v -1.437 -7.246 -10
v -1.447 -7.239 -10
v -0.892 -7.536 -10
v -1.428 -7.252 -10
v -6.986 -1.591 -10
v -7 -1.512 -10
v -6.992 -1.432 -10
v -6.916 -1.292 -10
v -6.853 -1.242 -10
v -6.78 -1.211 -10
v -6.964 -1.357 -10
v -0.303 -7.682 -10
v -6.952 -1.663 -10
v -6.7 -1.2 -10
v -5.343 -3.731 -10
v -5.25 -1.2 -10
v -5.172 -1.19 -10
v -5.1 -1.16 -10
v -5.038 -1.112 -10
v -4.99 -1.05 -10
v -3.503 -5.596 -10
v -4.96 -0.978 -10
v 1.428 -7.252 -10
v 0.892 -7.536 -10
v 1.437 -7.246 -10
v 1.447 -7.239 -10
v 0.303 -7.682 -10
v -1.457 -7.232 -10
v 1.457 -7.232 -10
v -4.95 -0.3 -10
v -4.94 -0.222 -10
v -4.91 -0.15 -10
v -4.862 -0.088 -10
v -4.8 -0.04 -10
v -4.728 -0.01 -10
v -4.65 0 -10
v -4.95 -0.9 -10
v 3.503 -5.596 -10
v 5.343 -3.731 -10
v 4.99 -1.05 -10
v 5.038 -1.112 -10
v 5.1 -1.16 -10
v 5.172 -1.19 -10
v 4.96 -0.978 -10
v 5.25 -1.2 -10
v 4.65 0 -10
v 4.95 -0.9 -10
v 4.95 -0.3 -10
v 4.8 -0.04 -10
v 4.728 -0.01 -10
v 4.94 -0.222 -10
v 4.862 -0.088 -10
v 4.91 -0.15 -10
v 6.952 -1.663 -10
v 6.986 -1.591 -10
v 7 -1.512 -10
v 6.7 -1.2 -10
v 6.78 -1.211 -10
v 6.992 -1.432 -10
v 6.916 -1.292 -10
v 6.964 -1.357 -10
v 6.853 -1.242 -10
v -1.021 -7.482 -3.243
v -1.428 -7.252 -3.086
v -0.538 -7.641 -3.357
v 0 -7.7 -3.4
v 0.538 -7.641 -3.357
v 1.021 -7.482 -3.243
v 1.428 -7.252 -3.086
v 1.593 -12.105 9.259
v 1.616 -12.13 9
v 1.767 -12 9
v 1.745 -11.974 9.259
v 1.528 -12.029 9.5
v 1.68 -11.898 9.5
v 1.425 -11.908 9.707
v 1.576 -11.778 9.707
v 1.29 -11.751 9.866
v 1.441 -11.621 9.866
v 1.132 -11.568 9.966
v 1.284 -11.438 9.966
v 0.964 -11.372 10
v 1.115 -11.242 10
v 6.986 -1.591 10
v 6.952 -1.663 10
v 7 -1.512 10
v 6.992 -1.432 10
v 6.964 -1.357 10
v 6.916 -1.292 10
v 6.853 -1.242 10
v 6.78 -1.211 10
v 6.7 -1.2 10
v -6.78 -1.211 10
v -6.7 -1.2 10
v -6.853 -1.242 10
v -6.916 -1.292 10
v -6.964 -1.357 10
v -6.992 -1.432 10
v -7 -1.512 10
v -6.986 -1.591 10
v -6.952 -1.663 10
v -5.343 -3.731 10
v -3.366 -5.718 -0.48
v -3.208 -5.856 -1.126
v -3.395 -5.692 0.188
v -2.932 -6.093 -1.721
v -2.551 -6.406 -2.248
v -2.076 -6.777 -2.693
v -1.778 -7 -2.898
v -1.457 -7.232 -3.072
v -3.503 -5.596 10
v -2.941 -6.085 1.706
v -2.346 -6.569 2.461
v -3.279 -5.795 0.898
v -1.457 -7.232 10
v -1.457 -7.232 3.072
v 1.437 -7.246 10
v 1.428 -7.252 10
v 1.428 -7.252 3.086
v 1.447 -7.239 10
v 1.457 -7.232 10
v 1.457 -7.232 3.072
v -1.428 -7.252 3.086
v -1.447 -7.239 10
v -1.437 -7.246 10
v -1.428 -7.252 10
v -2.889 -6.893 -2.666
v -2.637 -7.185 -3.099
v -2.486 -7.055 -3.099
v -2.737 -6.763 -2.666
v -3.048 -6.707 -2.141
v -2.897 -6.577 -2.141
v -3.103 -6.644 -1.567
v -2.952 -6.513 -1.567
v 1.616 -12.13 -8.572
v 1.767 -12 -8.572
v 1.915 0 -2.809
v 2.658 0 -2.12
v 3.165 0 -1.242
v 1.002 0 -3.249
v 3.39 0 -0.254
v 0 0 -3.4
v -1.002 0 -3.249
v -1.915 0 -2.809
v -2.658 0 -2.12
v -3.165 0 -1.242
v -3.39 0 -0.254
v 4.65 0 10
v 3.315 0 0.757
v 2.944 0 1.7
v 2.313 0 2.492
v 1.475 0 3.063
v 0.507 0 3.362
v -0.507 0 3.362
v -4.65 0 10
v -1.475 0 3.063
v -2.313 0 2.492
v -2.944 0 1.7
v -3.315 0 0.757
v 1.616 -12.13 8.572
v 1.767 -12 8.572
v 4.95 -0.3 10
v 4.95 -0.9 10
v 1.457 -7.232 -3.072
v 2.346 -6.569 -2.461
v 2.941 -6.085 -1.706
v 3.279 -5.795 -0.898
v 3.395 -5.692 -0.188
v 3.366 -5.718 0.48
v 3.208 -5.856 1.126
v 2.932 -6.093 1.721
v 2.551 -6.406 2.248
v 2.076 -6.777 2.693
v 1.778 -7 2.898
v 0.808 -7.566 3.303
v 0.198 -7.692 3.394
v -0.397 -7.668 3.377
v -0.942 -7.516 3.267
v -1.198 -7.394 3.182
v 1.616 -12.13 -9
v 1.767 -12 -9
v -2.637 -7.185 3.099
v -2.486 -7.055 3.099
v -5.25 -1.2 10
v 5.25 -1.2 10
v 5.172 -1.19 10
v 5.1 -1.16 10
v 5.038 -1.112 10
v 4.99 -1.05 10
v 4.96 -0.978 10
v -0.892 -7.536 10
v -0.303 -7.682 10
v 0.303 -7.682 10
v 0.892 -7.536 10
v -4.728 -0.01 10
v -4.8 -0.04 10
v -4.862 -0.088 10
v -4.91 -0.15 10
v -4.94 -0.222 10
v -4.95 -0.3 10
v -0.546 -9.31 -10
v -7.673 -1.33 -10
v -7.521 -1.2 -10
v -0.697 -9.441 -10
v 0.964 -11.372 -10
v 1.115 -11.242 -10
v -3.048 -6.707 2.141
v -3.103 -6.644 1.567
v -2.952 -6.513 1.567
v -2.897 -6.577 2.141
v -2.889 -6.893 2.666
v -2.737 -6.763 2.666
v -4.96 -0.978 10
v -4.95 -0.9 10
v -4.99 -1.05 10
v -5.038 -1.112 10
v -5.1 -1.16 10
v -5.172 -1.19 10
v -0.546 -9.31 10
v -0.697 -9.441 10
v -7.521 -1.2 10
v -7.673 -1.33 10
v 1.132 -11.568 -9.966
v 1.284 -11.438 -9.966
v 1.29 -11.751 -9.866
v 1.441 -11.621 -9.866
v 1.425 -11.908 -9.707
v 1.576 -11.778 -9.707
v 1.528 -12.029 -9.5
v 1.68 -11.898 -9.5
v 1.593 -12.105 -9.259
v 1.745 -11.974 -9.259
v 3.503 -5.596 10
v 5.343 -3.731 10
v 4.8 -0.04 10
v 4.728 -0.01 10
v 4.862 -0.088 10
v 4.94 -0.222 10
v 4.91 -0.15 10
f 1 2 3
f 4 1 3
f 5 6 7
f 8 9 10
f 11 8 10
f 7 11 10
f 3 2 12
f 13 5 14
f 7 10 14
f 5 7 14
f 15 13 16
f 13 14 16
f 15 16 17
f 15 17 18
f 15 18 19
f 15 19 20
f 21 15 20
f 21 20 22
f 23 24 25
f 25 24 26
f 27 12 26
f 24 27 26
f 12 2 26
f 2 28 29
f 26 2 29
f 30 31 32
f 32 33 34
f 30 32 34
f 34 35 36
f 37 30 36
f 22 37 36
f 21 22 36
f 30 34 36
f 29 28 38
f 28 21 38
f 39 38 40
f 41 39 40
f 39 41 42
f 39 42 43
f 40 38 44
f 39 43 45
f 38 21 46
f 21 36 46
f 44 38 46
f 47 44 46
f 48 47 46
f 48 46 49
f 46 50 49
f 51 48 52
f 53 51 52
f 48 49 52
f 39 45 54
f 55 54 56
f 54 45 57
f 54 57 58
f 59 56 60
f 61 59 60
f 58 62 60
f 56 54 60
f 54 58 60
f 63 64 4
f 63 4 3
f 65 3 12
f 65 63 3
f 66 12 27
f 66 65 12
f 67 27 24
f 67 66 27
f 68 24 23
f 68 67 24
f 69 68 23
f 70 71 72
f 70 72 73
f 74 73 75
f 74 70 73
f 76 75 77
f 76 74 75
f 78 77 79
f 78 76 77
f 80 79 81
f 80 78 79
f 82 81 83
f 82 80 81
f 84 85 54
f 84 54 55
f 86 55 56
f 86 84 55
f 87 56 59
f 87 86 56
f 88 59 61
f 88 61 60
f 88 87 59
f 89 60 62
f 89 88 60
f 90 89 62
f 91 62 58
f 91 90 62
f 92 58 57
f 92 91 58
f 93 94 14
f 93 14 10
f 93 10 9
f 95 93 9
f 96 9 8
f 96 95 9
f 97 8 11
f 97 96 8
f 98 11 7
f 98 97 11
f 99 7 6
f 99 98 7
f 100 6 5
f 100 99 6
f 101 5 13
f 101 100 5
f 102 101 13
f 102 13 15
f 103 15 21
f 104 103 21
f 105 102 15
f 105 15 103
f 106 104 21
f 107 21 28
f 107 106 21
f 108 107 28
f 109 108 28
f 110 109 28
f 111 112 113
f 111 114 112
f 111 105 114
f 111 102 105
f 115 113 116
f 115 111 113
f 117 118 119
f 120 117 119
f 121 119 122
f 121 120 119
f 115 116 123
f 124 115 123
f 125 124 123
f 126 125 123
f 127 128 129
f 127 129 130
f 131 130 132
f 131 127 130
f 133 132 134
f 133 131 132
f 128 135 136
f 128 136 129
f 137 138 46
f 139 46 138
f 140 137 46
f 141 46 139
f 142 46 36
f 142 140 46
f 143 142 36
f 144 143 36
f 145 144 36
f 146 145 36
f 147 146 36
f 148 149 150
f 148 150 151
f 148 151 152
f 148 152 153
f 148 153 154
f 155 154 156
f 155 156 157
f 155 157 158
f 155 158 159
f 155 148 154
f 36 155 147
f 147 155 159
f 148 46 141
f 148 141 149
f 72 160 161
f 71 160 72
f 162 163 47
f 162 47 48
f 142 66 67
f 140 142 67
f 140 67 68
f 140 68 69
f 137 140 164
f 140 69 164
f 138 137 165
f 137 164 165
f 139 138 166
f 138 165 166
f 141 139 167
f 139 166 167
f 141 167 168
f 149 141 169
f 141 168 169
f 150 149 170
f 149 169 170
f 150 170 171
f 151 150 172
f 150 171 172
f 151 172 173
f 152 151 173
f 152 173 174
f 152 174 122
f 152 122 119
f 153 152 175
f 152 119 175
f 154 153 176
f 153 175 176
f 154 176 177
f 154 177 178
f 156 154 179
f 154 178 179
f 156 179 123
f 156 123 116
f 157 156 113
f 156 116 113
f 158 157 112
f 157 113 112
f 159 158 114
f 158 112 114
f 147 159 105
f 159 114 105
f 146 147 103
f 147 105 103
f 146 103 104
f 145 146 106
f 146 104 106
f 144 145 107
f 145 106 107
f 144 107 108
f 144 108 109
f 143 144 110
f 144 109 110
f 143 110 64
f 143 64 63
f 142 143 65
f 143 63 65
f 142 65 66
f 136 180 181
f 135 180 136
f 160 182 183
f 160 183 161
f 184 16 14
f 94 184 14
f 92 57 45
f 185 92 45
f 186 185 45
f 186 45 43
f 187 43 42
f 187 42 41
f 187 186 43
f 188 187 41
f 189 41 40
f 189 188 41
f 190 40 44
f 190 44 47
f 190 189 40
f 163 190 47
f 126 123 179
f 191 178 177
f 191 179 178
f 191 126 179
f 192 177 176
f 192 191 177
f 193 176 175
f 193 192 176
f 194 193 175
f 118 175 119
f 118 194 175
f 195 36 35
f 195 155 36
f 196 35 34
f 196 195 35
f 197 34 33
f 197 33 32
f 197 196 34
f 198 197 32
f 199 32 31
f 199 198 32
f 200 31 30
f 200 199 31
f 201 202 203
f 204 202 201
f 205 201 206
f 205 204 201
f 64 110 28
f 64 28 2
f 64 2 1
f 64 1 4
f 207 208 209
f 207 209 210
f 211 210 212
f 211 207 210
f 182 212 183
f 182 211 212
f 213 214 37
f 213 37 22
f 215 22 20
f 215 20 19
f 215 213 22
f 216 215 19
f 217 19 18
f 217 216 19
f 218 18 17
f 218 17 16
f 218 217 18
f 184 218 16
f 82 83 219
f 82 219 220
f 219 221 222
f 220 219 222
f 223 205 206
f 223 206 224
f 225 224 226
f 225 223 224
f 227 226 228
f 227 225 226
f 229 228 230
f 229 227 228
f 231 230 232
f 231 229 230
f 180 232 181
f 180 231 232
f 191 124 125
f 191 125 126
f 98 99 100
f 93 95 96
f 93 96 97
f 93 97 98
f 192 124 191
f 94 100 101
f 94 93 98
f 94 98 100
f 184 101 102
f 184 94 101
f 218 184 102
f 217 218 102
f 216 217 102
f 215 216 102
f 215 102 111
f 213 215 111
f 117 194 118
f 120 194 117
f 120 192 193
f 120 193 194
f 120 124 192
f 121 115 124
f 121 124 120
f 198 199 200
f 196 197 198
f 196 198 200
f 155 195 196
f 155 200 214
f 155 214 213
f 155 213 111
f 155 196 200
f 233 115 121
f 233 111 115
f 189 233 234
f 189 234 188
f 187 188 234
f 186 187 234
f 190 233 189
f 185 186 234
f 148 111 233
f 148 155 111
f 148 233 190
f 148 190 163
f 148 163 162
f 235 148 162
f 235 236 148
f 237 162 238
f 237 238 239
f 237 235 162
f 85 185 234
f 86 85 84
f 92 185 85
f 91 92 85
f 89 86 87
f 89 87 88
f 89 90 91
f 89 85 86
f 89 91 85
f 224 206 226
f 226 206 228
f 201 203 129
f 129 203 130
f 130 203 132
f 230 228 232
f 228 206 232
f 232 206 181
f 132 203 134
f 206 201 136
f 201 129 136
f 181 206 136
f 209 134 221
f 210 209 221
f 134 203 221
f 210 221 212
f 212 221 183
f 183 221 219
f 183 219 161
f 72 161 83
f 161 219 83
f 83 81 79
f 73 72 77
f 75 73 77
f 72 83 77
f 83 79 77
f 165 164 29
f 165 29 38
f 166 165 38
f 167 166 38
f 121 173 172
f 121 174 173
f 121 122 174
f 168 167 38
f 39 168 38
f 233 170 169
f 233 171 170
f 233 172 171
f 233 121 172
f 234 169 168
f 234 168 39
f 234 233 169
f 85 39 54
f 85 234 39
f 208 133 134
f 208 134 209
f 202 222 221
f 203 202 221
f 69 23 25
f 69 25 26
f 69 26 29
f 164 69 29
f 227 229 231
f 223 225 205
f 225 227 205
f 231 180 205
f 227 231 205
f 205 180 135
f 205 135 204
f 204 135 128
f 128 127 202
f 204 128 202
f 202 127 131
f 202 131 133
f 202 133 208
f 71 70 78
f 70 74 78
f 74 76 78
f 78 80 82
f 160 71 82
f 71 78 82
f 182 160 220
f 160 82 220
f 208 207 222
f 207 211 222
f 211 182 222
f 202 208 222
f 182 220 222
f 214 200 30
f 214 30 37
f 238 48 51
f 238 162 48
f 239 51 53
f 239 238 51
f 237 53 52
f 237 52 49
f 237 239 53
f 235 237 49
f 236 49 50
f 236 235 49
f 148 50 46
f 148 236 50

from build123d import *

# Parameters (mm, degrees)
EXTRUDE_1_DEPTH        = 10
HOLE_WIZARD_M8_1_D     = 6.8
HOLE_WIZARD_M8_1_DEPTH = 19.75
HOLE_WIZARD_M8_1_TIP   = 2.042926105
EXTRUDE_2_DEPTH        = 20
CUT_EXTRUDE_1_DEPTH    = 0.2


with BuildPart() as part:
    # 草图1 → 凸台-拉伸1 (new, symmetric)
    with BuildSketch(Plane.XY):
        with BuildLine():
            ThreePointArc((-4.65, 0), (-4.862132034, -0.087867966), (-4.95, -0.3))
            Line((-4.95, -0.3), (-4.95, -0.9))
            ThreePointArc((-4.95, -0.9), (-5.037867966, -1.112132034), (-5.25, -1.2))
            Line((-5.25, -1.2), (-6.7, -1.2))
            ThreePointArc((-6.7, -1.2), (-6.963642143, -1.356846864), (-6.951607997, -1.663381198))
            ThreePointArc((-6.951607997, -1.663381198), (-4.450280622, -4.690515113), (-1.456621363, -7.231810573))
            ThreePointArc((-1.456621363, -7.231810573), (-1.442125297, -7.242125027), (-1.427556197, -7.252336061))
            ThreePointArc((-1.427556197, -7.252336061), (0, -7.7), (1.427556197, -7.252336061))
            ThreePointArc((1.427556197, -7.252336061), (1.442125297, -7.242125027), (1.456621363, -7.231810573))
            ThreePointArc((1.456621363, -7.231810573), (4.450280622, -4.690515113), (6.951607997, -1.663381198))
            ThreePointArc((6.951607997, -1.663381198), (6.963642143, -1.356846864), (6.7, -1.2))
            Line((6.7, -1.2), (5.25, -1.2))
            ThreePointArc((5.25, -1.2), (5.037867966, -1.112132034), (4.95, -0.9))
            Line((4.95, -0.9), (4.95, -0.3))
            ThreePointArc((4.95, -0.3), (4.862132034, -0.087867966), (4.65, 0))
            Line((4.65, 0), (-4.65, 0))
        make_face()
    extrude(amount=EXTRUDE_1_DEPTH, both=True)

    # M8 螺纹孔1
    with Locations(Plane.ZX):
        with Locations((0, 0)):
            Hole(HOLE_WIZARD_M8_1_D / 2, depth=HOLE_WIZARD_M8_1_DEPTH)
            with Locations((0, 0, -(HOLE_WIZARD_M8_1_DEPTH + HOLE_WIZARD_M8_1_TIP / 2))):  # 118° drill point
                Cone(0, HOLE_WIZARD_M8_1_D / 2, HOLE_WIZARD_M8_1_TIP, mode=Mode.SUBTRACT)


with BuildPart() as body_2:
    # 草图5 → 凸台-拉伸2 (new body)
    with BuildSketch(Plane.XY.offset(10)):
        Polygon((-7.52115968, -1.2), (1.767296875, -12), (1.615663005, -12.130411539), (-7.67279355, -1.330411539), align=None)
    extrude(amount=-EXTRUDE_2_DEPTH)

    # 草图6 → 切除-拉伸1 (cut)
    with BuildSketch(Plane(origin=(-5.068196823, -4.358863519, 0), x_dir=(0, 0, 1), z_dir=(-0.7581693513781735, -0.6520576927165261, 0))):
        with BuildLine():
            Line((-1.567384684, -3.013509016), (1.567384684, -3.013509016))
            ThreePointArc((1.567384684, -3.013509016), (2.412621207, -3.200893441), (3.09947357, -3.727933796))
            Line((3.09947357, -3.727933796), (8.572482406, -10.250411739))
            Line((8.572482406, -10.250411739), (9, -10.250411739))
            ThreePointArc((9, -10.250411739), (9.707106781, -9.95751852), (10, -9.250411739))
            Line((10, -9.250411739), (10, -6.702977697))
            Line((10, -6.702977697), (14.457590001, -13.418778721))
            Line((14.457590001, -13.418778721), (-1.066661314, -21.025239845))
            Line((-1.066661314, -21.025239845), (-16.310353871, -17.222009283))
            Line((-16.310353871, -17.222009283), (-10, -6.702977697))
            Line((-10, -6.702977697), (-10, -9.250411739))
            ThreePointArc((-10, -9.250411739), (-9.707106781, -9.95751852), (-9, -10.250411739))
            Line((-9, -10.250411739), (-8.572482406, -10.250411739))
            Line((-8.572482406, -10.250411739), (-3.09947357, -3.727933796))
            ThreePointArc((-3.09947357, -3.727933796), (-2.412621207, -3.200893441), (-1.567384684, -3.013509016))
        make_face()
    extrude(amount=-CUT_EXTRUDE_1_DEPTH, mode=Mode.SUBTRACT)


solid = Compound([part.part, body_2.part])
